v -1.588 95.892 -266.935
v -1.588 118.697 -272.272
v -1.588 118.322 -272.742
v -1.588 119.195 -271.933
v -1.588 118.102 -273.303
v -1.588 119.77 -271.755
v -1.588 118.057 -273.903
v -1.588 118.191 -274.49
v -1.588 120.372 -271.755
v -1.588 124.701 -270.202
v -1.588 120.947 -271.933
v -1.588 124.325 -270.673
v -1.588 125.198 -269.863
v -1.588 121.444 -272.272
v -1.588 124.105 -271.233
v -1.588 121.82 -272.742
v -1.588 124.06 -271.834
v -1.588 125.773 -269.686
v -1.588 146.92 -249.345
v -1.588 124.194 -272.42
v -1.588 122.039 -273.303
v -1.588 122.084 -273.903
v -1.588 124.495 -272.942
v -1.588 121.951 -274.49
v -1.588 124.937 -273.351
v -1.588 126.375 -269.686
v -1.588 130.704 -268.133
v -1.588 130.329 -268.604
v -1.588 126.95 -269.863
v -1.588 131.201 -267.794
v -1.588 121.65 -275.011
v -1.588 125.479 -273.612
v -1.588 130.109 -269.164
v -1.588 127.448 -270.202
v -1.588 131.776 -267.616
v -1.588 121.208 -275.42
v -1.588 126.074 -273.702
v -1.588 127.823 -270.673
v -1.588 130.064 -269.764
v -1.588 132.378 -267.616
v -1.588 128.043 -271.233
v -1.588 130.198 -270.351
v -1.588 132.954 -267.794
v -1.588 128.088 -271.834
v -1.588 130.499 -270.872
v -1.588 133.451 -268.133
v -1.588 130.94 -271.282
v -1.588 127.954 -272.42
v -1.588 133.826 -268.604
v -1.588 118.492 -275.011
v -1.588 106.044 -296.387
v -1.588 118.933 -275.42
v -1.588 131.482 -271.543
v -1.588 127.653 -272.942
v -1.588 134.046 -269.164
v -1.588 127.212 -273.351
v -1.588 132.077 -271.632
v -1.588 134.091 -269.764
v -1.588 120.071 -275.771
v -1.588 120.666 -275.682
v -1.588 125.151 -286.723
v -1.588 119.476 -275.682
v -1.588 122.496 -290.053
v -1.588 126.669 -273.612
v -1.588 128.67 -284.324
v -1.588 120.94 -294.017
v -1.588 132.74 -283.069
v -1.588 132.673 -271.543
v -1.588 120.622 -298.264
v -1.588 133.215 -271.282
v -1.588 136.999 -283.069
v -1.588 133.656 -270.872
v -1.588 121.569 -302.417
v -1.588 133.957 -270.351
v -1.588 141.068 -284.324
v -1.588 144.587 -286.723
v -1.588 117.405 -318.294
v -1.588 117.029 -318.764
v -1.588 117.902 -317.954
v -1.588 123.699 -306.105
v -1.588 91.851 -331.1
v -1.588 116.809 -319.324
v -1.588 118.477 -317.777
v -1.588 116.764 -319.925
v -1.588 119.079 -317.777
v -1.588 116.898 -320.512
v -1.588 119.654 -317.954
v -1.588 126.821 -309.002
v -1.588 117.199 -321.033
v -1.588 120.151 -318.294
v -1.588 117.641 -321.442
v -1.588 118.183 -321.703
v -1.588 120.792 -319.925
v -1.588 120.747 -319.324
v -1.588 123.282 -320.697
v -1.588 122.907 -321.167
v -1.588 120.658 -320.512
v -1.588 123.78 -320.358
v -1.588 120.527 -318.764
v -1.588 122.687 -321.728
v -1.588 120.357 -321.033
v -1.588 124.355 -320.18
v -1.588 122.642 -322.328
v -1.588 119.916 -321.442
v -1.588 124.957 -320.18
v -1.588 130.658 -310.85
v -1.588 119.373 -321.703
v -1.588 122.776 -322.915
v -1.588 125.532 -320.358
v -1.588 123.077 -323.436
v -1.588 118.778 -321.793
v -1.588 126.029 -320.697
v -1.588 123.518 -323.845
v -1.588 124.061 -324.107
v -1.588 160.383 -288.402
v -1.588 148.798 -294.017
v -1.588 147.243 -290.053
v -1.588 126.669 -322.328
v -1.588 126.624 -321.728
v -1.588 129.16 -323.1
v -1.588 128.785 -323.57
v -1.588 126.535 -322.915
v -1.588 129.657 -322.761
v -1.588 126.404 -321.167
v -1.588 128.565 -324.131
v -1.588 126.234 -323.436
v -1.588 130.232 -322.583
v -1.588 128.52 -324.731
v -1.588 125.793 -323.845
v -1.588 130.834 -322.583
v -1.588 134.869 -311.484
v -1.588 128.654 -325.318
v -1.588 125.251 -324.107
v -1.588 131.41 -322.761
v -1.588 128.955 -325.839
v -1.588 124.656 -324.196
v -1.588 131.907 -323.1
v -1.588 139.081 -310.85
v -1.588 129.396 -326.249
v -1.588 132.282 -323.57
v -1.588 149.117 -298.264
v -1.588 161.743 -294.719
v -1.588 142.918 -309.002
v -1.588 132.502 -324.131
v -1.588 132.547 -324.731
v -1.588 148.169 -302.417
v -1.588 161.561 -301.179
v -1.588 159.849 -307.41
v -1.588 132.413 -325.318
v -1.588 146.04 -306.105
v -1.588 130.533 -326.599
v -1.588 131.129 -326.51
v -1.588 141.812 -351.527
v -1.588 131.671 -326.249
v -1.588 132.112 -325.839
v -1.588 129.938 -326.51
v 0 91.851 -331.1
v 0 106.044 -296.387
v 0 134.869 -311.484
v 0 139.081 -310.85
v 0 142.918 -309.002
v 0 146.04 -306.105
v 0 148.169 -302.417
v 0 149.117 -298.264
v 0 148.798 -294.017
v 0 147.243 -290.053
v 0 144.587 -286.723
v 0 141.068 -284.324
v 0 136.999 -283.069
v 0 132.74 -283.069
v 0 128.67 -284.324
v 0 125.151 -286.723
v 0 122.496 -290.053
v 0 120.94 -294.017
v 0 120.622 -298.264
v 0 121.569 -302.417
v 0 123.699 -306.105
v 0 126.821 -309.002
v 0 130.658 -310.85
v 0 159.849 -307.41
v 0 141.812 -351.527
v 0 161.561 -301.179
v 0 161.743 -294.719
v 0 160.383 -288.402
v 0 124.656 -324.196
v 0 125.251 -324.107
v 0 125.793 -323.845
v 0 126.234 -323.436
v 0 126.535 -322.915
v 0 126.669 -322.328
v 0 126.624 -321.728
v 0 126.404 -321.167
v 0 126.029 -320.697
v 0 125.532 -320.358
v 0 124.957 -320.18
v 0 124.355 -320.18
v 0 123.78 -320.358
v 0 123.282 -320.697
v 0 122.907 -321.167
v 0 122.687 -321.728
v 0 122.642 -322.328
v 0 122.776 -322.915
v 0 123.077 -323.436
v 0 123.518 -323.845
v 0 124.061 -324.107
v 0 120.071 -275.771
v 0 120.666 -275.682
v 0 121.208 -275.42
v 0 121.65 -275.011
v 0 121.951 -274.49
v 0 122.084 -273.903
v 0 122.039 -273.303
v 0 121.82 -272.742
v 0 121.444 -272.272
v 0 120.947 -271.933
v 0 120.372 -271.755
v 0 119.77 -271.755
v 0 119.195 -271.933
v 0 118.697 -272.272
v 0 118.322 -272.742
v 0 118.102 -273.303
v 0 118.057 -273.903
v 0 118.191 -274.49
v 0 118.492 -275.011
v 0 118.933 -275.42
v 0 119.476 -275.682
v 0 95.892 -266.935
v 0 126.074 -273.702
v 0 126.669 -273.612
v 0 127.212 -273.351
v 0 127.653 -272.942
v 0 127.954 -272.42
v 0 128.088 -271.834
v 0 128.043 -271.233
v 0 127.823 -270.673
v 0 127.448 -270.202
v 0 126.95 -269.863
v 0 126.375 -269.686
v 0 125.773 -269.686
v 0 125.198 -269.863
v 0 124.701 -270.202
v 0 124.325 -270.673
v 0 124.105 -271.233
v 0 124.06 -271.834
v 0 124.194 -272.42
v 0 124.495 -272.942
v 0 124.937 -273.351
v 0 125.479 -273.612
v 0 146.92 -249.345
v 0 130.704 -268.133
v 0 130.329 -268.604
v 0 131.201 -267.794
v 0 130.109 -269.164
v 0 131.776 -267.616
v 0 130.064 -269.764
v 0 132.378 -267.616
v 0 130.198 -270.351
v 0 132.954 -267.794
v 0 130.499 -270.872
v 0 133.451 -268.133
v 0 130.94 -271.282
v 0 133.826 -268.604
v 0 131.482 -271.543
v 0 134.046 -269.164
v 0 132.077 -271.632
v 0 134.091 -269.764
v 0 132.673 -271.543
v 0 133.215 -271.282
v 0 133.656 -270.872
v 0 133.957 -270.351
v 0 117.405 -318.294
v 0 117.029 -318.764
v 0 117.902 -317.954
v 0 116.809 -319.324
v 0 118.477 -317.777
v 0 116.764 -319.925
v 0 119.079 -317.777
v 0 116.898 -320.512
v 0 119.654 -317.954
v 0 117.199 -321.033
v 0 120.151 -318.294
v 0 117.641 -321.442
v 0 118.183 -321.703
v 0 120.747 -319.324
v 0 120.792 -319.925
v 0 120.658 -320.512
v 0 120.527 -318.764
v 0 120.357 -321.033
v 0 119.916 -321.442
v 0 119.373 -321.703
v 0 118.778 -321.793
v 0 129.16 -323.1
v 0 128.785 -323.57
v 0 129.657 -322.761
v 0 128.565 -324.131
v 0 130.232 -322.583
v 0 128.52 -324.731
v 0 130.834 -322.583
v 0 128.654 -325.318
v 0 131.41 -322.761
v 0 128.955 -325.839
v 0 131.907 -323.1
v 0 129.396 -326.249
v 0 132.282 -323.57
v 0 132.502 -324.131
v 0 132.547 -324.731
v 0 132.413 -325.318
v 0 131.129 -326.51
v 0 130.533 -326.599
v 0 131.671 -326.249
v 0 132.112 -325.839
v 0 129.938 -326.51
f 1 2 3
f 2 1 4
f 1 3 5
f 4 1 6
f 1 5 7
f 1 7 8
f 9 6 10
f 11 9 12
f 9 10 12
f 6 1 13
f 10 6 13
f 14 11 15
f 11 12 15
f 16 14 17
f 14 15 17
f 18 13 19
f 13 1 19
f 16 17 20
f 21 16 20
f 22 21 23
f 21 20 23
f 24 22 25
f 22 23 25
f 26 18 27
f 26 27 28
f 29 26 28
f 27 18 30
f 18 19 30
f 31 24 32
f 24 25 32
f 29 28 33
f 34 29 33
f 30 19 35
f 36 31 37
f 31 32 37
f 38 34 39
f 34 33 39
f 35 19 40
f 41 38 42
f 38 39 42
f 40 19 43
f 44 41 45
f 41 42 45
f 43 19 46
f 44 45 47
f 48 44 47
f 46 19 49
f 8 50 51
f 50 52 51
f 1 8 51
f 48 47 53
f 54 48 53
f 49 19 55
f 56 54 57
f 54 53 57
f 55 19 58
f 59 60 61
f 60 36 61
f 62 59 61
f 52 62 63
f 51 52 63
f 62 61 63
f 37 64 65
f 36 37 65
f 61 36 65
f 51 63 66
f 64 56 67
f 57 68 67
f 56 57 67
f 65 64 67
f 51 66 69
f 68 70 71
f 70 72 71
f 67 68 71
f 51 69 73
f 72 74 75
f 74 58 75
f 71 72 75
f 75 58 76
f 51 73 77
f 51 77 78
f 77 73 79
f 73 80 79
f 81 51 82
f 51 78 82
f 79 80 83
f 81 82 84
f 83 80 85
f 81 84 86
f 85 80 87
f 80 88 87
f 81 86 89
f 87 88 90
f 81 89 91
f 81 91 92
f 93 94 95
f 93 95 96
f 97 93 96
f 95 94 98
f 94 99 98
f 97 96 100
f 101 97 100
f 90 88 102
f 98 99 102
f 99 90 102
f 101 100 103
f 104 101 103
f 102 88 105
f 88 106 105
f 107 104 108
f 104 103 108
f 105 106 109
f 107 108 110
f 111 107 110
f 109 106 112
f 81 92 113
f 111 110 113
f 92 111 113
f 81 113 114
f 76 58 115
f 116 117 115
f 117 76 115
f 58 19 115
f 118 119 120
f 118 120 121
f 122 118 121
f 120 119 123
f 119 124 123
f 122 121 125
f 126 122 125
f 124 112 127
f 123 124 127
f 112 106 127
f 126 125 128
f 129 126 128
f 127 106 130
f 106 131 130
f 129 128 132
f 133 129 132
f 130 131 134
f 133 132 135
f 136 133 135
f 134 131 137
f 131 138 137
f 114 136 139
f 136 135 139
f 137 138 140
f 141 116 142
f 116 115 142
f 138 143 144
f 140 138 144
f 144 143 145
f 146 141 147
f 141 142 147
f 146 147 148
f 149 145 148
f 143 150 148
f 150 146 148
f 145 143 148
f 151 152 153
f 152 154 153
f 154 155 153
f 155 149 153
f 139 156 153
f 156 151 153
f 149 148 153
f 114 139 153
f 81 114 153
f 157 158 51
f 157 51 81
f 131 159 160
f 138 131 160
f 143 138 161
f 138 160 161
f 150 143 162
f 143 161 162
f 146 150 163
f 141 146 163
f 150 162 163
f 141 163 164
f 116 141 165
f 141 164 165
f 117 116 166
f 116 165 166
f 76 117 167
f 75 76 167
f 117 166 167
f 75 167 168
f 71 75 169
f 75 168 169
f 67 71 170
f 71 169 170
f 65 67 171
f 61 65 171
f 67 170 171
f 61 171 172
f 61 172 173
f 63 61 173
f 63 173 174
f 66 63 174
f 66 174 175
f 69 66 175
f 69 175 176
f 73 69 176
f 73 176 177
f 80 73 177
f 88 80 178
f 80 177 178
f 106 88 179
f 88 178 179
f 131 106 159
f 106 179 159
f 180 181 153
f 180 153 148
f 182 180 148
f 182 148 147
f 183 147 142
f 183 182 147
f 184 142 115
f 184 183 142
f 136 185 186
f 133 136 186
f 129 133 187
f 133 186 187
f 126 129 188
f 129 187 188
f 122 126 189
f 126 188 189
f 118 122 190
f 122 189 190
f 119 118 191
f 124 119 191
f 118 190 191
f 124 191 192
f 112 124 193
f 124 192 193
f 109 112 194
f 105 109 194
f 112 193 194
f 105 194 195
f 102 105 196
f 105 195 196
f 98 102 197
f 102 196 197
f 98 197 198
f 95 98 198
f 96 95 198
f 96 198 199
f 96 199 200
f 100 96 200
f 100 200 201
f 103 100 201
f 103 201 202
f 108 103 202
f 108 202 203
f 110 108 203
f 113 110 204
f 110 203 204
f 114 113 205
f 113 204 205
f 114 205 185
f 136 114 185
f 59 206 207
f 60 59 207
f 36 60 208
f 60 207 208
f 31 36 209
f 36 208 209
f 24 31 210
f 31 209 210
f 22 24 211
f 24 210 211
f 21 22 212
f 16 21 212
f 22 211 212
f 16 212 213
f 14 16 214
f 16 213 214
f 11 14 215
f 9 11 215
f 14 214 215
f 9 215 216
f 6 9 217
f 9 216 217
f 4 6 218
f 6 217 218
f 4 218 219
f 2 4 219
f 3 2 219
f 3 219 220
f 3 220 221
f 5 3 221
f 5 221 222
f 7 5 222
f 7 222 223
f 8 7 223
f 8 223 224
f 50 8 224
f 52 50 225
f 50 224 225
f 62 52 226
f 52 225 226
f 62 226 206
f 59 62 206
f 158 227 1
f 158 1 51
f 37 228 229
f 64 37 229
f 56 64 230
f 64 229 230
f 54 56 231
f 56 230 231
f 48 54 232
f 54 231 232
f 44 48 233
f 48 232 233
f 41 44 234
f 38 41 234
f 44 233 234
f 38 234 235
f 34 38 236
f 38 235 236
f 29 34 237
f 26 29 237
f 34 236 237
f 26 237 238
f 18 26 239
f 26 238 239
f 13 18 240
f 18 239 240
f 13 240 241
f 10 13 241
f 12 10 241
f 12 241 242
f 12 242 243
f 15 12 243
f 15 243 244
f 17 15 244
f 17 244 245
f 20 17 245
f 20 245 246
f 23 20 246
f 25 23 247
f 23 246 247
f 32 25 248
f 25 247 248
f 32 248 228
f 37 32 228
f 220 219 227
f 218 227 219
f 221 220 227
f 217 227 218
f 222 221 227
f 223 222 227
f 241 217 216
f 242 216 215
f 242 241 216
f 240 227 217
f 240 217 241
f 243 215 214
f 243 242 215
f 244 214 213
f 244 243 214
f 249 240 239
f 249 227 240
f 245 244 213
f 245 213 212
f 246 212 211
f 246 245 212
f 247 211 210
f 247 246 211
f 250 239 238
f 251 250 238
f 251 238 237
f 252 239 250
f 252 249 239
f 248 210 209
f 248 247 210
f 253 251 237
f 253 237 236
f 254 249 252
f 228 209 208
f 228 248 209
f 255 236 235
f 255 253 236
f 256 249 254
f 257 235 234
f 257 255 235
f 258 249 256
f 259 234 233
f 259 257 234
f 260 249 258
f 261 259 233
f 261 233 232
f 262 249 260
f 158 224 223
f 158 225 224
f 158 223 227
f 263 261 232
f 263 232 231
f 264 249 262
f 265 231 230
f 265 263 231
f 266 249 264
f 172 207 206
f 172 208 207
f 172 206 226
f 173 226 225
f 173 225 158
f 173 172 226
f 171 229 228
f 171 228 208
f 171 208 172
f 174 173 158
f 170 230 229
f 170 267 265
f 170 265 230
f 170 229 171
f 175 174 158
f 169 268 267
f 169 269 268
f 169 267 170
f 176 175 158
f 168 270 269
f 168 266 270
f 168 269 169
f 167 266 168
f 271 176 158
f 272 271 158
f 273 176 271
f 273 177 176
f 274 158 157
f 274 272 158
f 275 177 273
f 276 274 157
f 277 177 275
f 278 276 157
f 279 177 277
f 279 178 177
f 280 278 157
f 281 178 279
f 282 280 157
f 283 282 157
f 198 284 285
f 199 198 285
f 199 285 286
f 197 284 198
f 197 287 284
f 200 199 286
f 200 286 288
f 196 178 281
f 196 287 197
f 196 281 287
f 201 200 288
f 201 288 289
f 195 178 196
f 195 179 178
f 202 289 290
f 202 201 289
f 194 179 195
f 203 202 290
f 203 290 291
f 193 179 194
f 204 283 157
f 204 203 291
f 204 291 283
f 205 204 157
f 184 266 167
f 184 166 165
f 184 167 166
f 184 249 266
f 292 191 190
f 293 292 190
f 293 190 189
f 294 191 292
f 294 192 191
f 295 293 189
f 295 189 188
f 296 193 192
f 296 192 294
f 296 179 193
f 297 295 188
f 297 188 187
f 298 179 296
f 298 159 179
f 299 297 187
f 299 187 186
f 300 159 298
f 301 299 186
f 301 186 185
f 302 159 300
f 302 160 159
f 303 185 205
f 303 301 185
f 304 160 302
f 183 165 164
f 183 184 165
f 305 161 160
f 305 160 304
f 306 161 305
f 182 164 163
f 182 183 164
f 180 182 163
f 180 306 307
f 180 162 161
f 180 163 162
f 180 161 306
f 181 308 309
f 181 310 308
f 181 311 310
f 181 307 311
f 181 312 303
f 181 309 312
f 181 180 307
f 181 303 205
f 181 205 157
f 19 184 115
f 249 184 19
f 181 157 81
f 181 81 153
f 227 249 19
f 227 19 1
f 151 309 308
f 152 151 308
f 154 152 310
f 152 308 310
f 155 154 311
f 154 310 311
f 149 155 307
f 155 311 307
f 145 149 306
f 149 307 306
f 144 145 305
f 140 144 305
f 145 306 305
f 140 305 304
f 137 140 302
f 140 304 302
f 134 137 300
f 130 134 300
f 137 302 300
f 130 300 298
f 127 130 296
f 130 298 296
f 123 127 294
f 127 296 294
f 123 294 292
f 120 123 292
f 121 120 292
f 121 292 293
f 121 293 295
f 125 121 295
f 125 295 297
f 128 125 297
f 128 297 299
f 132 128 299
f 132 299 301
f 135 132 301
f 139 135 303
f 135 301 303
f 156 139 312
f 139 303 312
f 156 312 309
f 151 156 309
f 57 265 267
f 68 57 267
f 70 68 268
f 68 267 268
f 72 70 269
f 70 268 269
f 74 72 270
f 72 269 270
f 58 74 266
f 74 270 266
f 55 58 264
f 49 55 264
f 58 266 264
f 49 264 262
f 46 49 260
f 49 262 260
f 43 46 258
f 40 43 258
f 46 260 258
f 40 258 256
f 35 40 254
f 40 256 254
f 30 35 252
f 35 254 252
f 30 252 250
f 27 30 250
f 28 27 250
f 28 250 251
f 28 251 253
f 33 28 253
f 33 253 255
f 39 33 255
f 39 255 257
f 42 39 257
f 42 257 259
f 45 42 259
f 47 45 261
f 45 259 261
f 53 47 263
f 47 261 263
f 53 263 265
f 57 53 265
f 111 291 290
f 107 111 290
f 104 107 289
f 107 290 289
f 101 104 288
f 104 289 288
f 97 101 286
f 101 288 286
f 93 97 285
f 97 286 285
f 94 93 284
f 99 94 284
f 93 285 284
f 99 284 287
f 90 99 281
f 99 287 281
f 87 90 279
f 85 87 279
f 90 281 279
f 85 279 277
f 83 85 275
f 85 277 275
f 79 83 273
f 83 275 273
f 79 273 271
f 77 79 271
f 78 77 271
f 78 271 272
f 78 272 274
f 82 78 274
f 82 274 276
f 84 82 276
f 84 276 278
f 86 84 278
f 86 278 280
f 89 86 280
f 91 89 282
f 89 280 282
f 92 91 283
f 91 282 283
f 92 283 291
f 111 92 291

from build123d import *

# Parameters (mm, degrees)
SKETCH1_R           = 2.0193
SKETCH1_R_2         = 14.2875
BOSS_EXTRUDE1_DEPTH = 1.5875


with BuildPart() as part:
    # Sketch1 → Boss-Extrude1 (new body)
    with BuildSketch(Plane(origin=(0, 0, 0), x_dir=(0, 0, -1), z_dir=(1, 0, 0))):
        with BuildLine():
            Line((288.401681083, 160.383356591), (249.345231223, 146.9200509))
            Line((249.345231223, 146.9200509), (266.935398847, 95.891758474))
            Line((266.935398847, 95.891758474), (296.387053498, 106.044156633))
            Line((296.387053498, 106.044156633), (331.100032982, 91.851270852))
            Line((331.100032982, 91.851270852), (351.527026912, 141.811640586))
            Line((351.527026912, 141.811640586), (307.41026186, 159.849395245))
            ThreePointArc((307.41026186, 159.849395245), (297.954559489, 161.846069046), (288.401681083, 160.383356591))
        make_face()
        with Locations((269.613187196, 132.077455087)):
            Circle(SKETCH1_R, mode=Mode.SUBTRACT)
        with Locations((271.682618681, 126.074126566)):
            Circle(SKETCH1_R, mode=Mode.SUBTRACT)
        with Locations((273.752050167, 120.070798045)):
            Circle(SKETCH1_R, mode=Mode.SUBTRACT)
        with Locations((297.196764895, 134.869210378)):
            Circle(SKETCH1_R_2, mode=Mode.SUBTRACT)
        with Locations((324.580125518, 130.53340397)):
            Circle(SKETCH1_R, mode=Mode.SUBTRACT)
        with Locations((322.176949762, 124.655713413)):
            Circle(SKETCH1_R, mode=Mode.SUBTRACT)
        with Locations((319.773774005, 118.778022856)):
            Circle(SKETCH1_R, mode=Mode.SUBTRACT)
    extrude(amount=-BOSS_EXTRUDE1_DEPTH)


solid = part.part
